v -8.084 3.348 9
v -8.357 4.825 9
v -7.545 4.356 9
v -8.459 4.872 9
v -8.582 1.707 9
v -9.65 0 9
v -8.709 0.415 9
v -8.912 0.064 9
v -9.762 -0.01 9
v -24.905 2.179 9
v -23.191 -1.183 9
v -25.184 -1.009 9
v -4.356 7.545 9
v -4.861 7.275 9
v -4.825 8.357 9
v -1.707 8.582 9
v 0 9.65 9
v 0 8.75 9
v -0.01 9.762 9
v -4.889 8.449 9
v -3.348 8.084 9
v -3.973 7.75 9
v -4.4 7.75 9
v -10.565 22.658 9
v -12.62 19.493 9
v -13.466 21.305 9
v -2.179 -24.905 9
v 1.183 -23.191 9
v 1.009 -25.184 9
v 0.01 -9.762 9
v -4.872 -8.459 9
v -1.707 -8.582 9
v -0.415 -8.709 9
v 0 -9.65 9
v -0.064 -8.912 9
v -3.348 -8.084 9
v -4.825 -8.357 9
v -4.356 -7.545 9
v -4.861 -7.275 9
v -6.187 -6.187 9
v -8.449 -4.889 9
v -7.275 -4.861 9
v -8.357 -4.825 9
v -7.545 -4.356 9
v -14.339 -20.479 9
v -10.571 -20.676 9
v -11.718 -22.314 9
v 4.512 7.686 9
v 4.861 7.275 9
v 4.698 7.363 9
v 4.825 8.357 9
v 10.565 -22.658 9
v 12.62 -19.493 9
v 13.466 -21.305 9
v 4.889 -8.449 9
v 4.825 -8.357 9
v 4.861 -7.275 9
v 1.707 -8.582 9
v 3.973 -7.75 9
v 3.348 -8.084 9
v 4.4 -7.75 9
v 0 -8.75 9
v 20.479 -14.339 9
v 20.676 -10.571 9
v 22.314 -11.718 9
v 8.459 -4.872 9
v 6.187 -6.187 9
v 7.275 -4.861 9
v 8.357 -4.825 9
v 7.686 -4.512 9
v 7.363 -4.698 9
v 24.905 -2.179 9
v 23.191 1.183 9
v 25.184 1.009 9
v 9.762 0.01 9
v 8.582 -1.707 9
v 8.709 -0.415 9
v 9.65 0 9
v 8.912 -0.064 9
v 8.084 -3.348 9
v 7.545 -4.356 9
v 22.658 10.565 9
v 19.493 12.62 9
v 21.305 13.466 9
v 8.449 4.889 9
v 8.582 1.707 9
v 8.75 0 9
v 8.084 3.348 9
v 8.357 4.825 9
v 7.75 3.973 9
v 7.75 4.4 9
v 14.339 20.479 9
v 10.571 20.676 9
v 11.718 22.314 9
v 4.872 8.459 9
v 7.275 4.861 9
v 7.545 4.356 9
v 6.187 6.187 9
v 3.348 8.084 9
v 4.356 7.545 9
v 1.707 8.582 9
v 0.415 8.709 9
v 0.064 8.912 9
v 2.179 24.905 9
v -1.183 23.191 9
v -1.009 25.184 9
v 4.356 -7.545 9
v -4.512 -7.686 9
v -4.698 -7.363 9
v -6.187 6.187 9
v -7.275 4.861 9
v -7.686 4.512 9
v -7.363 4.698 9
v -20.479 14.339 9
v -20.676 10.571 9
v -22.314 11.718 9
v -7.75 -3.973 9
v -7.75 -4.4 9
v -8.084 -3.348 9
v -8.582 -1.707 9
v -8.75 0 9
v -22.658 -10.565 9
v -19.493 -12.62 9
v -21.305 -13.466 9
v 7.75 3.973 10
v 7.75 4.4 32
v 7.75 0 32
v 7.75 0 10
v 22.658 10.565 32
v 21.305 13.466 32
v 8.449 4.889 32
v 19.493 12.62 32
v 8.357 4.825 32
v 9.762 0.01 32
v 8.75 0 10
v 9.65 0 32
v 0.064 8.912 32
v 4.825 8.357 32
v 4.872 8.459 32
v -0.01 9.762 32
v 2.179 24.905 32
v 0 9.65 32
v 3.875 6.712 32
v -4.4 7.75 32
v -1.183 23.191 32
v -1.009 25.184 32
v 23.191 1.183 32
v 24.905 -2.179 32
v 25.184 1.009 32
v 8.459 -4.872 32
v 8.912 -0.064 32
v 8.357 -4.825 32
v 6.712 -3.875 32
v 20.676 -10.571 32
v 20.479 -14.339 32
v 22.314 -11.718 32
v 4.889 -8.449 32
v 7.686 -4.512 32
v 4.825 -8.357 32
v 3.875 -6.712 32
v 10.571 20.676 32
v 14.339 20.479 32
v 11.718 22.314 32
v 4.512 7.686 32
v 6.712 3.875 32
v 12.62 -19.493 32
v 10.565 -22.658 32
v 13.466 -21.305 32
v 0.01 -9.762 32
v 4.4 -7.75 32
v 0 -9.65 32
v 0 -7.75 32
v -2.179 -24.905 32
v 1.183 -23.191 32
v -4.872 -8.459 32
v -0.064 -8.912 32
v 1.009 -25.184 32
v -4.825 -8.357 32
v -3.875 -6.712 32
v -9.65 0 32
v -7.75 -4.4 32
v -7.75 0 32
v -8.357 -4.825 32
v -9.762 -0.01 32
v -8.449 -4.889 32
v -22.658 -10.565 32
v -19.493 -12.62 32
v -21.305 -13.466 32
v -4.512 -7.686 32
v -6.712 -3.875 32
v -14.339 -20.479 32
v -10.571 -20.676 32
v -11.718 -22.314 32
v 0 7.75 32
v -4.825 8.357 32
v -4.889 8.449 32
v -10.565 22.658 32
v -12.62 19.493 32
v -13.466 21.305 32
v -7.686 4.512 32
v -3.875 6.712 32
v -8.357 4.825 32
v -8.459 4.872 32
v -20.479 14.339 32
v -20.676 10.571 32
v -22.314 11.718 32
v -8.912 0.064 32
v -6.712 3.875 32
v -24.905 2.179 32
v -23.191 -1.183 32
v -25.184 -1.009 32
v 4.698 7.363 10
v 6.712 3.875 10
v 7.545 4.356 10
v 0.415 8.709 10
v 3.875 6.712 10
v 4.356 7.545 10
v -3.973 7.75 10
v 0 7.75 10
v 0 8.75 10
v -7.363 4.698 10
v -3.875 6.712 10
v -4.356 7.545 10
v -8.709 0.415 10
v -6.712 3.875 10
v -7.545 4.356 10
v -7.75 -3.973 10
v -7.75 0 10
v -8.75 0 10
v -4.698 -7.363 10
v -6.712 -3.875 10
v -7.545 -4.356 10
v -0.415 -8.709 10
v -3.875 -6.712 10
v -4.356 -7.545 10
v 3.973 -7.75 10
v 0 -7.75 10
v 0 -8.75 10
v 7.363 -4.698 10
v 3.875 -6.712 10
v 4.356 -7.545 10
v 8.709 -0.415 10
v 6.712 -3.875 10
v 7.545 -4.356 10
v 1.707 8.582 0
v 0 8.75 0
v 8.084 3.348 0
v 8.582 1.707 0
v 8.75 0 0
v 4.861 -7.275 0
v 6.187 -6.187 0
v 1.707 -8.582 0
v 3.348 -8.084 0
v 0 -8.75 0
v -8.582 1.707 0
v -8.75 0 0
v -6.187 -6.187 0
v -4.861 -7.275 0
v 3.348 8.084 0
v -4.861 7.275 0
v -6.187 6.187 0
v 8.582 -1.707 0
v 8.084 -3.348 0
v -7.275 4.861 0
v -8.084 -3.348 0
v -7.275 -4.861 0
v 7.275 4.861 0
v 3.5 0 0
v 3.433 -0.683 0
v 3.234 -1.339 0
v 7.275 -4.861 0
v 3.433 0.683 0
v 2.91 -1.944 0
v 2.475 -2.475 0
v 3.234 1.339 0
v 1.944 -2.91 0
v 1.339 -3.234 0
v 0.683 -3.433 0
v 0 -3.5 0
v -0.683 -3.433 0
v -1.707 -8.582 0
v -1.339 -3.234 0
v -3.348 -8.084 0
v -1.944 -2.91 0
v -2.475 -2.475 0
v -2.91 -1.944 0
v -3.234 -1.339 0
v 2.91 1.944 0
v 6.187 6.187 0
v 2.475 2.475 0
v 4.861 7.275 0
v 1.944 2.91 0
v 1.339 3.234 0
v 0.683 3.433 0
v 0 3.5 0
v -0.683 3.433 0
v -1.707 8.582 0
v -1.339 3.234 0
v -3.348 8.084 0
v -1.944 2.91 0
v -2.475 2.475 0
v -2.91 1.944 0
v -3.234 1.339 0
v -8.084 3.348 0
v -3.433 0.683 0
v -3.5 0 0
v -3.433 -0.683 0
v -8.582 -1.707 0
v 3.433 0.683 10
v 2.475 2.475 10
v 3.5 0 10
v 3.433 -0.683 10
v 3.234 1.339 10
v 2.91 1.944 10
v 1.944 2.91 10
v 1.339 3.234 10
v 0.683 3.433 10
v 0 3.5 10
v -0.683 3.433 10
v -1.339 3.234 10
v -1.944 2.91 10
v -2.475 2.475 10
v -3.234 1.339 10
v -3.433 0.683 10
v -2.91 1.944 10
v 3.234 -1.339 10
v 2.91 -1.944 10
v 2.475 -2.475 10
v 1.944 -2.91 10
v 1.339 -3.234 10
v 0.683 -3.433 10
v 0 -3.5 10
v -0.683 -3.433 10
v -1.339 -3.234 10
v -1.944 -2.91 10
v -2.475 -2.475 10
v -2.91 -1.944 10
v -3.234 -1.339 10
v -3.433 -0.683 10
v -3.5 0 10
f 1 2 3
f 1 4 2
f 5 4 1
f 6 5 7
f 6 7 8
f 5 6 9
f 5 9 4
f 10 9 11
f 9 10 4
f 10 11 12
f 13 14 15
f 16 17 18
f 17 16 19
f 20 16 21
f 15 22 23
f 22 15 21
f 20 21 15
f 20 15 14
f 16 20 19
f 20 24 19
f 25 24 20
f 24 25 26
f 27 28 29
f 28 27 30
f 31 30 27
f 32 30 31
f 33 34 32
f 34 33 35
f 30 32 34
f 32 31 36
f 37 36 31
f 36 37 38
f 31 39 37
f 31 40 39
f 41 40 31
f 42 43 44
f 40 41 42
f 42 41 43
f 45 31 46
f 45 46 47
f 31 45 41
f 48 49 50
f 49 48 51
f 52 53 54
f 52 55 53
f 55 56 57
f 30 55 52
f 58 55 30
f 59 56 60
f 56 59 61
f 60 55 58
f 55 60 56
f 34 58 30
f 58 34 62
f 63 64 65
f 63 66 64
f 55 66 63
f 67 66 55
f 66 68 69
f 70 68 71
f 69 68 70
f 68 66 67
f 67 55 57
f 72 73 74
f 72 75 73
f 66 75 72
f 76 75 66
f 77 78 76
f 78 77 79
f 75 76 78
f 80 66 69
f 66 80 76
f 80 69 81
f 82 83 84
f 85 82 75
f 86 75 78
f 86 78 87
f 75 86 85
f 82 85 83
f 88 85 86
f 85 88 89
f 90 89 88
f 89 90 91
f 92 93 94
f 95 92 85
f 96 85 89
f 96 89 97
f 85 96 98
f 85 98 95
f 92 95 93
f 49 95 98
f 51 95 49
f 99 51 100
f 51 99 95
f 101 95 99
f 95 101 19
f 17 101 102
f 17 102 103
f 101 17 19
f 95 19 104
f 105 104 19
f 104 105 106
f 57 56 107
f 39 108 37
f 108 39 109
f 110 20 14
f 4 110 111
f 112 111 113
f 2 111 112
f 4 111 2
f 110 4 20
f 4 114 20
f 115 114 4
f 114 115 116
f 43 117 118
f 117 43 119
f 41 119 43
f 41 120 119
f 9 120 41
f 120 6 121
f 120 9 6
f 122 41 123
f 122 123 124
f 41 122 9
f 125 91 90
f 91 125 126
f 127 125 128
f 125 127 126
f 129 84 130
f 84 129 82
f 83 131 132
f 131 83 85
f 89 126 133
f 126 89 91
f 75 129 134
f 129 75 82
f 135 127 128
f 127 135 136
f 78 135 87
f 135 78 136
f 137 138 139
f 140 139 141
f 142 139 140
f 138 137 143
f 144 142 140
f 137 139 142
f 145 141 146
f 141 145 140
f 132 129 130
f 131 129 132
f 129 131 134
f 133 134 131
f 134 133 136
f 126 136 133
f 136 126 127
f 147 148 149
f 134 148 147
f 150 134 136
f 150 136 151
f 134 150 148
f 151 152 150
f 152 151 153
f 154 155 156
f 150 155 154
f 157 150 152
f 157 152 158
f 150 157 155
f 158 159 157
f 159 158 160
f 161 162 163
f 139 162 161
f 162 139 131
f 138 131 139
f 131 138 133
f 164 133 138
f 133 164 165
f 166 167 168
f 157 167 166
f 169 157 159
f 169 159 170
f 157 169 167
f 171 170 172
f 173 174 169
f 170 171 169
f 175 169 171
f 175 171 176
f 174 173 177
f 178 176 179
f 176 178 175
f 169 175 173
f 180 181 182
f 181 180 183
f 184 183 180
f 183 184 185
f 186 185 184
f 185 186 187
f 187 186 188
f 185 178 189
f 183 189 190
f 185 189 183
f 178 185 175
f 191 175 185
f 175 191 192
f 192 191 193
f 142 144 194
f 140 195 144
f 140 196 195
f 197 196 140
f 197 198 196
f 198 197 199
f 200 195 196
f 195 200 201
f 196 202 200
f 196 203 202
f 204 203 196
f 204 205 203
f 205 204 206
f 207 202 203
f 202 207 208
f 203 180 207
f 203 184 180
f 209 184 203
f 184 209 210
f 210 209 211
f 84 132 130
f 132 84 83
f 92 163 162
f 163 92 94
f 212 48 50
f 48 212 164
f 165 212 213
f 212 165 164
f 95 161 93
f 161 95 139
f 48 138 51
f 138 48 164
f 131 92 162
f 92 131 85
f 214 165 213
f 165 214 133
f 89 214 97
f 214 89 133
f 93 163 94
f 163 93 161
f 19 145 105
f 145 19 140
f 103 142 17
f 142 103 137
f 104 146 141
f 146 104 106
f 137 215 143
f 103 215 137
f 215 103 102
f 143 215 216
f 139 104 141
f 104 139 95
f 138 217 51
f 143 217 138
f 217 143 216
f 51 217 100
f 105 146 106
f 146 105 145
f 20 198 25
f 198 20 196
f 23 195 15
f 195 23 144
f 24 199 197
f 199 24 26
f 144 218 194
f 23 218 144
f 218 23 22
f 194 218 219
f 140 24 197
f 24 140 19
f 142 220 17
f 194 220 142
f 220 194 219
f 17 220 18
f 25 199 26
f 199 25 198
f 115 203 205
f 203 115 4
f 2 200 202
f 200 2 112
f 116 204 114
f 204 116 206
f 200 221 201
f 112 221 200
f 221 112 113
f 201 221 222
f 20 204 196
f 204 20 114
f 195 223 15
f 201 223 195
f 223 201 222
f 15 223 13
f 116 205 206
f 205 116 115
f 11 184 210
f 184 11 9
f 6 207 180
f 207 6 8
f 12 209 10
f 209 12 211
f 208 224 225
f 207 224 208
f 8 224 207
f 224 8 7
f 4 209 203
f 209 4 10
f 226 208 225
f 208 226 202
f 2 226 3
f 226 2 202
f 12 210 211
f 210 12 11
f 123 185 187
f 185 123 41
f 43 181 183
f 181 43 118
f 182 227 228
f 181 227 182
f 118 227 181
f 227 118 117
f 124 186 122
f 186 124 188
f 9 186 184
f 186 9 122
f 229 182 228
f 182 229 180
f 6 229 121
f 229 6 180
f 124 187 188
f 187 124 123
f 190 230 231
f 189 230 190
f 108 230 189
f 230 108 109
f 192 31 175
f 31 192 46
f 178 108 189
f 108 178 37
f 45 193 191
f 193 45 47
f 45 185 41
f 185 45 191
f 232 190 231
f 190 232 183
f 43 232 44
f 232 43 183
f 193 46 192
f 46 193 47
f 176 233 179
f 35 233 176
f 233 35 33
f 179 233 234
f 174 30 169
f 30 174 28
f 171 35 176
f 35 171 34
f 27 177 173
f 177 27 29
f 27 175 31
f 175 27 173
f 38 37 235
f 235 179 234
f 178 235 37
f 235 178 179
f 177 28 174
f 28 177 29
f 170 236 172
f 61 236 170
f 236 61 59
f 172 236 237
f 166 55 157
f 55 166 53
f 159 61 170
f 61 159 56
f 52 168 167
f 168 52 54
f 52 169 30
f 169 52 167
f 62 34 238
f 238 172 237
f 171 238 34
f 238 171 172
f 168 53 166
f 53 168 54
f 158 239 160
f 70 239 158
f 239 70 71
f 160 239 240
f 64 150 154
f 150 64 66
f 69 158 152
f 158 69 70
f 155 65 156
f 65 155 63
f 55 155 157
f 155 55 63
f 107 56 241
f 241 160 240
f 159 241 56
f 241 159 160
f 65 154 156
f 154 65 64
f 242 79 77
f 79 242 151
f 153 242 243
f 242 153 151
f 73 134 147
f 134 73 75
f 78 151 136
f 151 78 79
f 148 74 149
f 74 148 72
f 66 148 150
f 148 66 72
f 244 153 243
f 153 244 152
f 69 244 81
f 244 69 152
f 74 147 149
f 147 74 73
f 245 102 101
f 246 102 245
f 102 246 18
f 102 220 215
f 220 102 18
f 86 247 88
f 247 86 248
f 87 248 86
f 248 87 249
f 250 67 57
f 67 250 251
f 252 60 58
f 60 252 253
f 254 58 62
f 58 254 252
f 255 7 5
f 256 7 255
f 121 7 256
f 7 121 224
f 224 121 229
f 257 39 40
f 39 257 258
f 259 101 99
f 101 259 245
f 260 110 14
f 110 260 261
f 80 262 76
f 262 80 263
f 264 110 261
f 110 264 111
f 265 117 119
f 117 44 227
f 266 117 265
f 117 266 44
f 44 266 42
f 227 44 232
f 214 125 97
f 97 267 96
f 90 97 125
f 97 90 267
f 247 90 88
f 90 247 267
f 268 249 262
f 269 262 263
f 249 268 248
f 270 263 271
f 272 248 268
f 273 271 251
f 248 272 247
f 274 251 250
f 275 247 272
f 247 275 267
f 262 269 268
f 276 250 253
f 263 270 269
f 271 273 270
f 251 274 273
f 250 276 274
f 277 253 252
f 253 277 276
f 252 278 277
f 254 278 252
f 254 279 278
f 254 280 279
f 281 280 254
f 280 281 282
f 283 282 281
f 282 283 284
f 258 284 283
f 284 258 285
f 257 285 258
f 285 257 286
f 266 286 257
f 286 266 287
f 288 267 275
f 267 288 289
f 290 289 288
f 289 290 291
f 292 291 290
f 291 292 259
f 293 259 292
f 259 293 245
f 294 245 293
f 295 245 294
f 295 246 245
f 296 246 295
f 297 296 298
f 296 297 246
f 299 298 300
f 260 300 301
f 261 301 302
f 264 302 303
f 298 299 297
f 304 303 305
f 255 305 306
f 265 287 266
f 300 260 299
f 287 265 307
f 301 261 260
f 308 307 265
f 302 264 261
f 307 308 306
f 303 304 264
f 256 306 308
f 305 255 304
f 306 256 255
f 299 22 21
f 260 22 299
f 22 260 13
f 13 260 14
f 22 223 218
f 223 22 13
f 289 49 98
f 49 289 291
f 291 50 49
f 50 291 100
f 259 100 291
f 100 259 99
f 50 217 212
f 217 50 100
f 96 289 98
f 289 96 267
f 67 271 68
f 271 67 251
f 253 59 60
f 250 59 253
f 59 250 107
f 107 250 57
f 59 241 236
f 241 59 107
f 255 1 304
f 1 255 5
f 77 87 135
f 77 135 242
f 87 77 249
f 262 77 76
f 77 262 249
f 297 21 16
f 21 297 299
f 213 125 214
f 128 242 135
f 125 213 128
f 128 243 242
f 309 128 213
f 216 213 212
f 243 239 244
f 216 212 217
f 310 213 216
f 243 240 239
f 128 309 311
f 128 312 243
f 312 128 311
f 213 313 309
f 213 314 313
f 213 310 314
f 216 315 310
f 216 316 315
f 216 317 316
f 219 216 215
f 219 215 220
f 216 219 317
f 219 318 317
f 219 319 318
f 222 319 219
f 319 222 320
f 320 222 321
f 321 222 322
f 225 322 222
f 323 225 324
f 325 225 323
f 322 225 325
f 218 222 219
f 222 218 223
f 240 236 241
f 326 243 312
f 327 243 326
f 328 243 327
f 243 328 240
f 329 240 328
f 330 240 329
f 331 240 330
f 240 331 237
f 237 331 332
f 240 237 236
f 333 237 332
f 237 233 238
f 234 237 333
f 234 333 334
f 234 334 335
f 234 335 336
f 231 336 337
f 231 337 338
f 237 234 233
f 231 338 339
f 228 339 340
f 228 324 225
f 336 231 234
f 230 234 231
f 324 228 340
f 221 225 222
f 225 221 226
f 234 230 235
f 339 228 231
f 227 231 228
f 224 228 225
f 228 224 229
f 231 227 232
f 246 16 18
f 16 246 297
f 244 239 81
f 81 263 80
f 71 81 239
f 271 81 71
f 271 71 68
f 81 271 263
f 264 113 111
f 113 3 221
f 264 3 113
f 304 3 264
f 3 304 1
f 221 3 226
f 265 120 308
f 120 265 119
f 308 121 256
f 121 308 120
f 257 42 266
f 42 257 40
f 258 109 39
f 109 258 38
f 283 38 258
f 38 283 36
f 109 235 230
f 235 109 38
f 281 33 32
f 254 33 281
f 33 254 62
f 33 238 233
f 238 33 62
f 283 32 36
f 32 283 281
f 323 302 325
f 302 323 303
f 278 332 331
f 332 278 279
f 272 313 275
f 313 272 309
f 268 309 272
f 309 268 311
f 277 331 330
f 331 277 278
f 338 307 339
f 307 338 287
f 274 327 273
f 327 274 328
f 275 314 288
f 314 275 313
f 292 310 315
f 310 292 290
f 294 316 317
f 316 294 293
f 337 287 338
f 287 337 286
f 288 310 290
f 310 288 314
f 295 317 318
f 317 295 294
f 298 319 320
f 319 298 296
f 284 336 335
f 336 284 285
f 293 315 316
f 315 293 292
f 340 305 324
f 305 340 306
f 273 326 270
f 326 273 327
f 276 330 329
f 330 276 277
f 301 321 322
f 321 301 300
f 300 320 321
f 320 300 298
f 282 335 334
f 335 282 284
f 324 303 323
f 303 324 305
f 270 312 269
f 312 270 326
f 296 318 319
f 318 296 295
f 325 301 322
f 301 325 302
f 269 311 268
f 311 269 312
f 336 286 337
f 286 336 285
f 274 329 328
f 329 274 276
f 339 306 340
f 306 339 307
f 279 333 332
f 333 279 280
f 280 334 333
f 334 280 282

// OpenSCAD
$fn = 32;

// ----------------------------------------------------------------------
// Impeller: 50 mm, 12 blades, 32 mm tall
// ----------------------------------------------------------------------

// --- parameters (mm) ---
center_d = 17.5;          // hub diameter
center_h = 10;            // hub height
wheel_d = 50;             // outer diameter over the blades
blade_count = 12;         // number of blades
blade_t = 2;              // blade thickness
blade_h = 22;             // blade height
blade_in_r = 7.75;        // blade root radius
blade_out_r = 23;         // blade tip radius
sweep = 25;               // blade sweep, degrees
bore_d = 7;               // shaft bore

module hub() {
  cylinder(h = center_h, d = center_d);
}

module blade() {
  /* blade swept between two boxes: hull of the root and the tip section */
  hull() {
    translate([blade_in_r, 0, center_h - 1])
      cube([blade_t, blade_t * 2.2, blade_h + 1], center = false);
    rotate([0, 0, sweep])
      translate([blade_out_r, 0, center_h - 1])
        cube([blade_t, blade_t * 1.6, blade_h + 1], center = false);
  }
}

module blades() {
  for (i = [0 : blade_count - 1])
    rotate([0, 0, i * 360 / blade_count]) blade();
}

difference() {
  union() {
    hub();
    blades();
  }
  translate([0, 0, -1]) cylinder(h = center_h + blade_h + 0 + 3, d = bore_d);
}
